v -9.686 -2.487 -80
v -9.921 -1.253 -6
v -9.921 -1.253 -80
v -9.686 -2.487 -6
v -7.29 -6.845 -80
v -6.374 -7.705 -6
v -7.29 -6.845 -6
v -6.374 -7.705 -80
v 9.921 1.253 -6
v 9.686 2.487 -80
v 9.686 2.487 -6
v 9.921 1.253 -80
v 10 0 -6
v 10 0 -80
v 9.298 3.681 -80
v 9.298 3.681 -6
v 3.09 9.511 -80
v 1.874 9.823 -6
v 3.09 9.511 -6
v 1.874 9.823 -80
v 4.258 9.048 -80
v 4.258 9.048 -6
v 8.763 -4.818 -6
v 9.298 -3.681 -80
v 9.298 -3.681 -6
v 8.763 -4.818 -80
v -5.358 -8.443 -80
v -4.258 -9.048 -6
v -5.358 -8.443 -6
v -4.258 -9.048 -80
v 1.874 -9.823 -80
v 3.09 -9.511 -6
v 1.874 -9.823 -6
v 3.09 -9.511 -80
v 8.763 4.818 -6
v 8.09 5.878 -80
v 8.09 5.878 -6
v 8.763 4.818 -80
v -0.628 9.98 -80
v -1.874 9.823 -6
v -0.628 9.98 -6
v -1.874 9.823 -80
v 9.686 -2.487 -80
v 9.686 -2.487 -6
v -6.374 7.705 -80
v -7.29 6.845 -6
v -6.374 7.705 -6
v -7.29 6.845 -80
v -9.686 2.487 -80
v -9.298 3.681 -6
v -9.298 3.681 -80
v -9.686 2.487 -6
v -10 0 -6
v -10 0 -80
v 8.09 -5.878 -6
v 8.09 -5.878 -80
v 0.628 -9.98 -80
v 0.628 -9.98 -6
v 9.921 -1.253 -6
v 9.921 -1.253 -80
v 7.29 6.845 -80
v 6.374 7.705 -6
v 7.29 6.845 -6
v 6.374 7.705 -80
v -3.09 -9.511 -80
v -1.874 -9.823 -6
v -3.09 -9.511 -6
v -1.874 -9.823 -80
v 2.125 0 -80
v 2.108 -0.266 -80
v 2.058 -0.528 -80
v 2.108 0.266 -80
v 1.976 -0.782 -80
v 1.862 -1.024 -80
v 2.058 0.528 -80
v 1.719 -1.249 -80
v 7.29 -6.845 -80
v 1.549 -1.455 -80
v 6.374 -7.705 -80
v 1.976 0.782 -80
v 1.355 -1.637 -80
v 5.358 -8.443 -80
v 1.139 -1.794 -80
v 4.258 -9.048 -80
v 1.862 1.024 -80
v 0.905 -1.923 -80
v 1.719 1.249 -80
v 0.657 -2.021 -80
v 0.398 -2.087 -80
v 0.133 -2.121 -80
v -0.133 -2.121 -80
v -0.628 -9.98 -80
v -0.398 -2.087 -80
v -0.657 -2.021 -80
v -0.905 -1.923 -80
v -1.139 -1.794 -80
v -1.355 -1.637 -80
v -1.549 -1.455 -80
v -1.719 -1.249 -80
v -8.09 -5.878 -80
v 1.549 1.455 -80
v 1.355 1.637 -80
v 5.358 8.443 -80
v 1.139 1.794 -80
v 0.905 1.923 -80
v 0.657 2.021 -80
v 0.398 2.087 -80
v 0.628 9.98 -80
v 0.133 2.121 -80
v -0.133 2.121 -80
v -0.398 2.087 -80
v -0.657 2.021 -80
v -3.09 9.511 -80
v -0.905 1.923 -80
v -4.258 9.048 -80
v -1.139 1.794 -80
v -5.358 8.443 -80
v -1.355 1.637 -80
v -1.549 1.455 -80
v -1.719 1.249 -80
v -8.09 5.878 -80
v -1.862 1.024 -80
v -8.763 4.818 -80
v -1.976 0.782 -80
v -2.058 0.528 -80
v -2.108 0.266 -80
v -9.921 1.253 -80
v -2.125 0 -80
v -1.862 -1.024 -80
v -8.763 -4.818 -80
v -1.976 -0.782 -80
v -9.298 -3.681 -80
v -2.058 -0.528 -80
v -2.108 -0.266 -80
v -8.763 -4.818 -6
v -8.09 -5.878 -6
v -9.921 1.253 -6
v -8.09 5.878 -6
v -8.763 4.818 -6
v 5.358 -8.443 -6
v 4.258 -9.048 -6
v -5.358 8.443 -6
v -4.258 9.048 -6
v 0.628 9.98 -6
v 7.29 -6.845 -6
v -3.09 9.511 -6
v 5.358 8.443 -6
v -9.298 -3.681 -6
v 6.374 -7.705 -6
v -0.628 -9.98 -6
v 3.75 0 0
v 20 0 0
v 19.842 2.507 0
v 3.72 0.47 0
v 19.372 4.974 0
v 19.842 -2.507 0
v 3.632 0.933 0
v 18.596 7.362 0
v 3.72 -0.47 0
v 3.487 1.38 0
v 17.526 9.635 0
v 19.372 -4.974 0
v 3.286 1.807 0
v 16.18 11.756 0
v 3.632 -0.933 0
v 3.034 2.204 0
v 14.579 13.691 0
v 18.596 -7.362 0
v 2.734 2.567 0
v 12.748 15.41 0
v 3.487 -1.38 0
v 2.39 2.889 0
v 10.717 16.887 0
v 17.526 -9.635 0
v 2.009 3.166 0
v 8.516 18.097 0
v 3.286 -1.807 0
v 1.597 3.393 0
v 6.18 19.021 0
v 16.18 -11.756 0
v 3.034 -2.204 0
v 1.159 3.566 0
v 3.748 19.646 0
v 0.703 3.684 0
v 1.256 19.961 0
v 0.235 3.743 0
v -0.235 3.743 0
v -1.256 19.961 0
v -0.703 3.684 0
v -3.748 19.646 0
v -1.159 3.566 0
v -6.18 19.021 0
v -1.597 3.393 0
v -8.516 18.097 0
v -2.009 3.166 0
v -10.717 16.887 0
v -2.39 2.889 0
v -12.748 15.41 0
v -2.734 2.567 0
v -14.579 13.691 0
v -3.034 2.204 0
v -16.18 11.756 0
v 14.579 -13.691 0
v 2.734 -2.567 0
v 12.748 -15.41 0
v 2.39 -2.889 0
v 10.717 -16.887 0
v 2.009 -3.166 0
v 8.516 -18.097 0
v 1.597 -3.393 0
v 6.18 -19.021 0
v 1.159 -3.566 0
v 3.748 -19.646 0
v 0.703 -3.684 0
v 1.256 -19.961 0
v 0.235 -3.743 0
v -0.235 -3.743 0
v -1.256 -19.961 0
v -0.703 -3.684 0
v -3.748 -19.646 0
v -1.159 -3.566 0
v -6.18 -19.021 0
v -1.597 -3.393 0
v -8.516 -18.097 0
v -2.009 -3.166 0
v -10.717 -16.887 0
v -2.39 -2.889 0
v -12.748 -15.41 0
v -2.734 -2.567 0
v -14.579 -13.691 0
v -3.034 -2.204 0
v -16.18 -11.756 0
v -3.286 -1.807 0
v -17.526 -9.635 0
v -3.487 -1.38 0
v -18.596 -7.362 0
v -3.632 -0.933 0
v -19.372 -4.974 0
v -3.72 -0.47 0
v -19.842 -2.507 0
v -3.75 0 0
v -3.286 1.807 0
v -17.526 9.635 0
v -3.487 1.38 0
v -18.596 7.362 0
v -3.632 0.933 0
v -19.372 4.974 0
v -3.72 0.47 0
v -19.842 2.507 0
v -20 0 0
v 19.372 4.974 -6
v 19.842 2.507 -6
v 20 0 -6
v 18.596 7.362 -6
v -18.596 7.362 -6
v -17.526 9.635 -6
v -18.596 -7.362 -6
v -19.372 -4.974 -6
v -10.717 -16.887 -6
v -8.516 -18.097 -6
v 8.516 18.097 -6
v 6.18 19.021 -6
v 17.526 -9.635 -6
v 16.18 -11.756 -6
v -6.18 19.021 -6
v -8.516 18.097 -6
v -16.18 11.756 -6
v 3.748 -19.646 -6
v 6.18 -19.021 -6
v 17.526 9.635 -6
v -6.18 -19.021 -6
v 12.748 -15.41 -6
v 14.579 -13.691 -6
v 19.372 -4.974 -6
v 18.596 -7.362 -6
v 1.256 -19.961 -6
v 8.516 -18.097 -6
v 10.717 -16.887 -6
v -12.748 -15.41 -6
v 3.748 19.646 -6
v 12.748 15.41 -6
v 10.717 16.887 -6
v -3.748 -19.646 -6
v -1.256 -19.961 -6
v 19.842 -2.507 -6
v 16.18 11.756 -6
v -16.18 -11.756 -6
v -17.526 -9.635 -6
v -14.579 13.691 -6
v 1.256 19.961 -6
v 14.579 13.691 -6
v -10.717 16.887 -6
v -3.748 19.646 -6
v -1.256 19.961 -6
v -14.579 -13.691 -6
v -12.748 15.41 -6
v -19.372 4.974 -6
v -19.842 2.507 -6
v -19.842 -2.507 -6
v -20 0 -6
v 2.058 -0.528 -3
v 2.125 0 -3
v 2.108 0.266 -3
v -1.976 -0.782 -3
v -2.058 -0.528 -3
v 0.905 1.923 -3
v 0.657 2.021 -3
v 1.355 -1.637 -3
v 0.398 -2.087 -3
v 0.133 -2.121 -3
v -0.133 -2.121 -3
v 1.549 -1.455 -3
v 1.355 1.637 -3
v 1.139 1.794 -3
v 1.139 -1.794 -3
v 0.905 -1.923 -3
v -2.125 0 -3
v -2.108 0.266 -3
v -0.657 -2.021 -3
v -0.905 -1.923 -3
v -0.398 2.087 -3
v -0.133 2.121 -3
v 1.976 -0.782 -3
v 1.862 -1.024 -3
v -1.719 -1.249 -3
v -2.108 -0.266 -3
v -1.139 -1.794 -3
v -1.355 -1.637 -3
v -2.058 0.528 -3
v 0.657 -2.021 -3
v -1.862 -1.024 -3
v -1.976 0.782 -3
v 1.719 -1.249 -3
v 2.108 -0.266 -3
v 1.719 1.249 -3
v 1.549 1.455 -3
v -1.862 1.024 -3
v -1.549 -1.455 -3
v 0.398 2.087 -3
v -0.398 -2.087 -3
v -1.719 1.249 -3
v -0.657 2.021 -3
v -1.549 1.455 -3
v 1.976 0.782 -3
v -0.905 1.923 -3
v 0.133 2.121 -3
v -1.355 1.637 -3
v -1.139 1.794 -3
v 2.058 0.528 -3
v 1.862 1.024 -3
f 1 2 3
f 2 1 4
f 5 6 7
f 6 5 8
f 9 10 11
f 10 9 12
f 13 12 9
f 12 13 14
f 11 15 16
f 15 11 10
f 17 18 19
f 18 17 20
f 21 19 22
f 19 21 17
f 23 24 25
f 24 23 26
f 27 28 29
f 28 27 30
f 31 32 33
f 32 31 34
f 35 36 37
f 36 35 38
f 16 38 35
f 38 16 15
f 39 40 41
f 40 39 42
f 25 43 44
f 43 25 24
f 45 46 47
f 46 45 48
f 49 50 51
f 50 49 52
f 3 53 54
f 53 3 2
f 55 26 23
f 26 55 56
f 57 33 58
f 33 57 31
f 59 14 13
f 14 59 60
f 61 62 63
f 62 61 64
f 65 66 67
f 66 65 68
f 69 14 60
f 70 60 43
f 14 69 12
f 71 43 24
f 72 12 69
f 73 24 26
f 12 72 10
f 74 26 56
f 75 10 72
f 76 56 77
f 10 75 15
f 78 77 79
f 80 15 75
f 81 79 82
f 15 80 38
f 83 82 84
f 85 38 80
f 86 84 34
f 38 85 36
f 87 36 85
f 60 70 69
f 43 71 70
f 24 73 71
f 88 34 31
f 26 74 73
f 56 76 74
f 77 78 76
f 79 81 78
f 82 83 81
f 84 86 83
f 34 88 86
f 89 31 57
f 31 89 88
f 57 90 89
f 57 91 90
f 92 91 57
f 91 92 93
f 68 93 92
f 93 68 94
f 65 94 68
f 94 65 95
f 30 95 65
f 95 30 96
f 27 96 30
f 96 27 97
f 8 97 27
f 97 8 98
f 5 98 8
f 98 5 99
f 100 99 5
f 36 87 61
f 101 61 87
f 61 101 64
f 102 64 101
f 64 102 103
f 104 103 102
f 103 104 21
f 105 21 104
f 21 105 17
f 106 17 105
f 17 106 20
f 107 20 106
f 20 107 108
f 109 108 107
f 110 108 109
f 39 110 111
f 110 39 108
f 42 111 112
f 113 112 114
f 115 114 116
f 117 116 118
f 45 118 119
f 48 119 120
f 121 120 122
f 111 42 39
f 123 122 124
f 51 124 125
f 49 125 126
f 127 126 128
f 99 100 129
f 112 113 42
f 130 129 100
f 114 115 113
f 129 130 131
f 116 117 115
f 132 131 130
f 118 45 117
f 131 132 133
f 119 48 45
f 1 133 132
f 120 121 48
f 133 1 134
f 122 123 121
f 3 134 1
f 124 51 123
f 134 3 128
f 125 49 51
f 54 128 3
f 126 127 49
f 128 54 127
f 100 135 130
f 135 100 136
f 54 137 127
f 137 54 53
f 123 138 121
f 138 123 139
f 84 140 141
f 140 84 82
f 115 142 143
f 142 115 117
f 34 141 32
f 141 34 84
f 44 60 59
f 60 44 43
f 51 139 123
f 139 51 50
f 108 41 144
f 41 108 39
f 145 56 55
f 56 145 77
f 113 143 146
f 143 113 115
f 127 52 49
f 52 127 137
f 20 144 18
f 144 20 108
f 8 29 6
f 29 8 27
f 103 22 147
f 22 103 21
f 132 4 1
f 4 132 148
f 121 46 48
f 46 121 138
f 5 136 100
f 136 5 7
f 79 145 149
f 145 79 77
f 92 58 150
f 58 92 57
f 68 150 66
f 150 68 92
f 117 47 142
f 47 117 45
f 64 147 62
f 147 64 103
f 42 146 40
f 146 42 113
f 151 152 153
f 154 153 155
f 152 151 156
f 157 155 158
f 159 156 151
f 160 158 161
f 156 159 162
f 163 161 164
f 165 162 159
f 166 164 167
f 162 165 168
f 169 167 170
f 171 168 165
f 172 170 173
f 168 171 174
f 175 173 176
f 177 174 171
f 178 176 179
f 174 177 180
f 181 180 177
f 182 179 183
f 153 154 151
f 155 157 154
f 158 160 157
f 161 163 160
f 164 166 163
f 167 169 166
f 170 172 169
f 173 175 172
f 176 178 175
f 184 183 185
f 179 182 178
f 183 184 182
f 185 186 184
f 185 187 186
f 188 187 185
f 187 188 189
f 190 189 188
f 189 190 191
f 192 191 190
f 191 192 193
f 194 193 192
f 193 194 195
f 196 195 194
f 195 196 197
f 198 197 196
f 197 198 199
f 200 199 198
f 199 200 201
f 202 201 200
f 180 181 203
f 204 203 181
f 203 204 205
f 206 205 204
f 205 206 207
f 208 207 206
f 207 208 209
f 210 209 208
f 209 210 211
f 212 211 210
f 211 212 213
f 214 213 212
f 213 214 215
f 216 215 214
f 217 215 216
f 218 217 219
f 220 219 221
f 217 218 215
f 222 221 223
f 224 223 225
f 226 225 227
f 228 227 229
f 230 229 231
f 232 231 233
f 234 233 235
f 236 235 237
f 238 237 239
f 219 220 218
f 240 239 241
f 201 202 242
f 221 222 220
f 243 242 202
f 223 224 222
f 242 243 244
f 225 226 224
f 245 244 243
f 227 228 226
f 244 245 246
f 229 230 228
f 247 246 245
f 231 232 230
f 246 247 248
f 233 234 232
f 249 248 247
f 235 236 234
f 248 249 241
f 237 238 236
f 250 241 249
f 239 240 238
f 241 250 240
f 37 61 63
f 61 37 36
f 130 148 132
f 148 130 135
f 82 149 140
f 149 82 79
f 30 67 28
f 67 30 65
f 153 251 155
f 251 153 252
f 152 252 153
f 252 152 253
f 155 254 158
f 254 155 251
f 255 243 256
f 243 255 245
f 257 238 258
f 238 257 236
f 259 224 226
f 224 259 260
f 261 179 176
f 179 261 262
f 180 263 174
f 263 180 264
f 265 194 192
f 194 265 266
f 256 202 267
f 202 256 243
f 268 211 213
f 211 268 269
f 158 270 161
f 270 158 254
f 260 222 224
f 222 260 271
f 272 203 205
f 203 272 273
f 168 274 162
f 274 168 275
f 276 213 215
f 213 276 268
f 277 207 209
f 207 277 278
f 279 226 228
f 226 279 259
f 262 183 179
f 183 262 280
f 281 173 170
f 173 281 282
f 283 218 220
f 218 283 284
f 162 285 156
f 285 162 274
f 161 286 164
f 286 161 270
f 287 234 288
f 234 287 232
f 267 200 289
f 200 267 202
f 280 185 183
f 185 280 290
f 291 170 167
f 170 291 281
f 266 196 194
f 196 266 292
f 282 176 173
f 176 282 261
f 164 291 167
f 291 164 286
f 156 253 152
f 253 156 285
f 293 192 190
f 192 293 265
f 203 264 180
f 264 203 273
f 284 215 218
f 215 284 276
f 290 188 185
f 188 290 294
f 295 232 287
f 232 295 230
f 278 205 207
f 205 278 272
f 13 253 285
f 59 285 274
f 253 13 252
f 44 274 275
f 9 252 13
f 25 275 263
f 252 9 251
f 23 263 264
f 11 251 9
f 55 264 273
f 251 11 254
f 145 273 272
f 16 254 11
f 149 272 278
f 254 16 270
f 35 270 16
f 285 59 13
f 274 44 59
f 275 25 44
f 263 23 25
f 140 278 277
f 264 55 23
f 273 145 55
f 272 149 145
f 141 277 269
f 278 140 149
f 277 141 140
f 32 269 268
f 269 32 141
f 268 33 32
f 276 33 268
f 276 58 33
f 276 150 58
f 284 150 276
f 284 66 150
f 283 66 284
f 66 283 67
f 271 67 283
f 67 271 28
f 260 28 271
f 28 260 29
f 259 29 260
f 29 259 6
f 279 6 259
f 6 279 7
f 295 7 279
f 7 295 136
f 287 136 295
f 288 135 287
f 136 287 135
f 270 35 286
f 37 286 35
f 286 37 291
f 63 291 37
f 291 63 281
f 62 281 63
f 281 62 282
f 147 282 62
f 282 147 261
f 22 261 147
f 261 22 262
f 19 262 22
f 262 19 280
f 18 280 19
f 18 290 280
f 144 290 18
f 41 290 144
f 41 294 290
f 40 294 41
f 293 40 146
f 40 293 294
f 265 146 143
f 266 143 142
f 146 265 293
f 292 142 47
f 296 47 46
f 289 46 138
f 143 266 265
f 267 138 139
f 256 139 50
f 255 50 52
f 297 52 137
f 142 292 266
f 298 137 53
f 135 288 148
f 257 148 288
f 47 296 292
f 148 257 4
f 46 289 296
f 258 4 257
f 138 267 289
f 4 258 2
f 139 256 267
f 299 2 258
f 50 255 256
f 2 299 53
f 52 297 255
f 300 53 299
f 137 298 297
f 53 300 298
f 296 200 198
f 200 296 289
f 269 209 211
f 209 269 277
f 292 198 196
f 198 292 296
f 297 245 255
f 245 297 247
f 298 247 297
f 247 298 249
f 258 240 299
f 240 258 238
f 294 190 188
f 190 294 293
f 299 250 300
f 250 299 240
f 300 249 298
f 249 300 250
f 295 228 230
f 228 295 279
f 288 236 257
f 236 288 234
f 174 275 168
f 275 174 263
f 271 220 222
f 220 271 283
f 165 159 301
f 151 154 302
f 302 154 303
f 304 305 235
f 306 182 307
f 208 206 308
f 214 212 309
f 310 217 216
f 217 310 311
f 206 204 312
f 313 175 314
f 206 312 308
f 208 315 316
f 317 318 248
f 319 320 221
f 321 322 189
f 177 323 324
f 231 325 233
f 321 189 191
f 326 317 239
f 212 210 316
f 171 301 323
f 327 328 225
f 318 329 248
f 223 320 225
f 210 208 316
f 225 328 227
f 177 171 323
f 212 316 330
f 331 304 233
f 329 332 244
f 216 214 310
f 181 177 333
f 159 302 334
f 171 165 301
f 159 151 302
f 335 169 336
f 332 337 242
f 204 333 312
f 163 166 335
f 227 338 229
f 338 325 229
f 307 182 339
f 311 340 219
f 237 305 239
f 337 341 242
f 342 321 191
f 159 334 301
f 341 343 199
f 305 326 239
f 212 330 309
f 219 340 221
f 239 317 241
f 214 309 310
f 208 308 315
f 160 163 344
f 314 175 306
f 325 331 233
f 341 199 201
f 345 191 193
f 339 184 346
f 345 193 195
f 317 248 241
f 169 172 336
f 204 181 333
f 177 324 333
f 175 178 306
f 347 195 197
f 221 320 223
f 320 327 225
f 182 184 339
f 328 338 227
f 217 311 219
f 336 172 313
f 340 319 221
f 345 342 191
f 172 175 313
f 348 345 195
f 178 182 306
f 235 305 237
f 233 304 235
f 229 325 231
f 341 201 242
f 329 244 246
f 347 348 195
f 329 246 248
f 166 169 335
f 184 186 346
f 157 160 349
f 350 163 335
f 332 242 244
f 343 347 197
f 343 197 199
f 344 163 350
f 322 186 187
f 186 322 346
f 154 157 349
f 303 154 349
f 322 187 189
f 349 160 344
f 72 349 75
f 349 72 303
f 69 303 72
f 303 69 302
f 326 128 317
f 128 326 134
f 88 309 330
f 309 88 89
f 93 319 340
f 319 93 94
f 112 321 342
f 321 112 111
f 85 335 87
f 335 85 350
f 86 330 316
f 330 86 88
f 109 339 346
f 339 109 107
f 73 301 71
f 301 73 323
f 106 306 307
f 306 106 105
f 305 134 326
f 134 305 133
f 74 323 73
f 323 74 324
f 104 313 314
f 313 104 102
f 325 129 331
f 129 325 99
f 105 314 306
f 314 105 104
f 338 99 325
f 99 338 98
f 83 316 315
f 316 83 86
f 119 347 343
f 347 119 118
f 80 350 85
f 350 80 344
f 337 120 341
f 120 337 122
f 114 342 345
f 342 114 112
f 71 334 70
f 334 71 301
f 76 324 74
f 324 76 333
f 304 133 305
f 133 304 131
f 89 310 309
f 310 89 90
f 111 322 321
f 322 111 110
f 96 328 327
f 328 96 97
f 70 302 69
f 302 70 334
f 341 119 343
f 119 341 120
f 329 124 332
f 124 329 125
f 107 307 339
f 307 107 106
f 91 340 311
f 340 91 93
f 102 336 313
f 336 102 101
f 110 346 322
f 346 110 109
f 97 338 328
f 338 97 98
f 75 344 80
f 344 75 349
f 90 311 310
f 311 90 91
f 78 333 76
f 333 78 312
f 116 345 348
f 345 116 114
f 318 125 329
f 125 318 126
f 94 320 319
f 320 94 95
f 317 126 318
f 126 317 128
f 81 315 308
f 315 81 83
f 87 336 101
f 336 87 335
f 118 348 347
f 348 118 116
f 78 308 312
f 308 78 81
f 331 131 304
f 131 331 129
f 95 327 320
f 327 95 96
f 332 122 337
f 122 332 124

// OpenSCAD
$fn = 50;


difference() {
	union() {
		translate(v = [0, 0, -80.0000000000]) {
			cylinder(h = 80, r = 10.0000000000);
		}
		translate(v = [0, 0, -6.0000000000]) {
			cylinder(h = 6, r = 20.0000000000);
		}
	}
	union() {
		translate(v = [0, 0, 0]) {
			rotate(a = [0, 0, 0]) {
				difference() {
					union() {
						#translate(v = [0, 0, -80.0000000000]) {
							cylinder(h = 80, r = 2.0000000000);
						}
						#translate(v = [0, 0, -3]) {
							cylinder(h = 3, r = 10.0000000000, r1 = 2.1250000000, r2 = 3.7500000000);
						}
						#translate(v = [0, 0, -80.0000000000]) {
							cylinder(h = 80, r = 2.1250000000);
						}
						#translate(v = [0, 0, -80.0000000000]) {
							cylinder(h = 80, r = 2.0000000000);
						}
					}
					union();
				}
			}
		}
	}
}
